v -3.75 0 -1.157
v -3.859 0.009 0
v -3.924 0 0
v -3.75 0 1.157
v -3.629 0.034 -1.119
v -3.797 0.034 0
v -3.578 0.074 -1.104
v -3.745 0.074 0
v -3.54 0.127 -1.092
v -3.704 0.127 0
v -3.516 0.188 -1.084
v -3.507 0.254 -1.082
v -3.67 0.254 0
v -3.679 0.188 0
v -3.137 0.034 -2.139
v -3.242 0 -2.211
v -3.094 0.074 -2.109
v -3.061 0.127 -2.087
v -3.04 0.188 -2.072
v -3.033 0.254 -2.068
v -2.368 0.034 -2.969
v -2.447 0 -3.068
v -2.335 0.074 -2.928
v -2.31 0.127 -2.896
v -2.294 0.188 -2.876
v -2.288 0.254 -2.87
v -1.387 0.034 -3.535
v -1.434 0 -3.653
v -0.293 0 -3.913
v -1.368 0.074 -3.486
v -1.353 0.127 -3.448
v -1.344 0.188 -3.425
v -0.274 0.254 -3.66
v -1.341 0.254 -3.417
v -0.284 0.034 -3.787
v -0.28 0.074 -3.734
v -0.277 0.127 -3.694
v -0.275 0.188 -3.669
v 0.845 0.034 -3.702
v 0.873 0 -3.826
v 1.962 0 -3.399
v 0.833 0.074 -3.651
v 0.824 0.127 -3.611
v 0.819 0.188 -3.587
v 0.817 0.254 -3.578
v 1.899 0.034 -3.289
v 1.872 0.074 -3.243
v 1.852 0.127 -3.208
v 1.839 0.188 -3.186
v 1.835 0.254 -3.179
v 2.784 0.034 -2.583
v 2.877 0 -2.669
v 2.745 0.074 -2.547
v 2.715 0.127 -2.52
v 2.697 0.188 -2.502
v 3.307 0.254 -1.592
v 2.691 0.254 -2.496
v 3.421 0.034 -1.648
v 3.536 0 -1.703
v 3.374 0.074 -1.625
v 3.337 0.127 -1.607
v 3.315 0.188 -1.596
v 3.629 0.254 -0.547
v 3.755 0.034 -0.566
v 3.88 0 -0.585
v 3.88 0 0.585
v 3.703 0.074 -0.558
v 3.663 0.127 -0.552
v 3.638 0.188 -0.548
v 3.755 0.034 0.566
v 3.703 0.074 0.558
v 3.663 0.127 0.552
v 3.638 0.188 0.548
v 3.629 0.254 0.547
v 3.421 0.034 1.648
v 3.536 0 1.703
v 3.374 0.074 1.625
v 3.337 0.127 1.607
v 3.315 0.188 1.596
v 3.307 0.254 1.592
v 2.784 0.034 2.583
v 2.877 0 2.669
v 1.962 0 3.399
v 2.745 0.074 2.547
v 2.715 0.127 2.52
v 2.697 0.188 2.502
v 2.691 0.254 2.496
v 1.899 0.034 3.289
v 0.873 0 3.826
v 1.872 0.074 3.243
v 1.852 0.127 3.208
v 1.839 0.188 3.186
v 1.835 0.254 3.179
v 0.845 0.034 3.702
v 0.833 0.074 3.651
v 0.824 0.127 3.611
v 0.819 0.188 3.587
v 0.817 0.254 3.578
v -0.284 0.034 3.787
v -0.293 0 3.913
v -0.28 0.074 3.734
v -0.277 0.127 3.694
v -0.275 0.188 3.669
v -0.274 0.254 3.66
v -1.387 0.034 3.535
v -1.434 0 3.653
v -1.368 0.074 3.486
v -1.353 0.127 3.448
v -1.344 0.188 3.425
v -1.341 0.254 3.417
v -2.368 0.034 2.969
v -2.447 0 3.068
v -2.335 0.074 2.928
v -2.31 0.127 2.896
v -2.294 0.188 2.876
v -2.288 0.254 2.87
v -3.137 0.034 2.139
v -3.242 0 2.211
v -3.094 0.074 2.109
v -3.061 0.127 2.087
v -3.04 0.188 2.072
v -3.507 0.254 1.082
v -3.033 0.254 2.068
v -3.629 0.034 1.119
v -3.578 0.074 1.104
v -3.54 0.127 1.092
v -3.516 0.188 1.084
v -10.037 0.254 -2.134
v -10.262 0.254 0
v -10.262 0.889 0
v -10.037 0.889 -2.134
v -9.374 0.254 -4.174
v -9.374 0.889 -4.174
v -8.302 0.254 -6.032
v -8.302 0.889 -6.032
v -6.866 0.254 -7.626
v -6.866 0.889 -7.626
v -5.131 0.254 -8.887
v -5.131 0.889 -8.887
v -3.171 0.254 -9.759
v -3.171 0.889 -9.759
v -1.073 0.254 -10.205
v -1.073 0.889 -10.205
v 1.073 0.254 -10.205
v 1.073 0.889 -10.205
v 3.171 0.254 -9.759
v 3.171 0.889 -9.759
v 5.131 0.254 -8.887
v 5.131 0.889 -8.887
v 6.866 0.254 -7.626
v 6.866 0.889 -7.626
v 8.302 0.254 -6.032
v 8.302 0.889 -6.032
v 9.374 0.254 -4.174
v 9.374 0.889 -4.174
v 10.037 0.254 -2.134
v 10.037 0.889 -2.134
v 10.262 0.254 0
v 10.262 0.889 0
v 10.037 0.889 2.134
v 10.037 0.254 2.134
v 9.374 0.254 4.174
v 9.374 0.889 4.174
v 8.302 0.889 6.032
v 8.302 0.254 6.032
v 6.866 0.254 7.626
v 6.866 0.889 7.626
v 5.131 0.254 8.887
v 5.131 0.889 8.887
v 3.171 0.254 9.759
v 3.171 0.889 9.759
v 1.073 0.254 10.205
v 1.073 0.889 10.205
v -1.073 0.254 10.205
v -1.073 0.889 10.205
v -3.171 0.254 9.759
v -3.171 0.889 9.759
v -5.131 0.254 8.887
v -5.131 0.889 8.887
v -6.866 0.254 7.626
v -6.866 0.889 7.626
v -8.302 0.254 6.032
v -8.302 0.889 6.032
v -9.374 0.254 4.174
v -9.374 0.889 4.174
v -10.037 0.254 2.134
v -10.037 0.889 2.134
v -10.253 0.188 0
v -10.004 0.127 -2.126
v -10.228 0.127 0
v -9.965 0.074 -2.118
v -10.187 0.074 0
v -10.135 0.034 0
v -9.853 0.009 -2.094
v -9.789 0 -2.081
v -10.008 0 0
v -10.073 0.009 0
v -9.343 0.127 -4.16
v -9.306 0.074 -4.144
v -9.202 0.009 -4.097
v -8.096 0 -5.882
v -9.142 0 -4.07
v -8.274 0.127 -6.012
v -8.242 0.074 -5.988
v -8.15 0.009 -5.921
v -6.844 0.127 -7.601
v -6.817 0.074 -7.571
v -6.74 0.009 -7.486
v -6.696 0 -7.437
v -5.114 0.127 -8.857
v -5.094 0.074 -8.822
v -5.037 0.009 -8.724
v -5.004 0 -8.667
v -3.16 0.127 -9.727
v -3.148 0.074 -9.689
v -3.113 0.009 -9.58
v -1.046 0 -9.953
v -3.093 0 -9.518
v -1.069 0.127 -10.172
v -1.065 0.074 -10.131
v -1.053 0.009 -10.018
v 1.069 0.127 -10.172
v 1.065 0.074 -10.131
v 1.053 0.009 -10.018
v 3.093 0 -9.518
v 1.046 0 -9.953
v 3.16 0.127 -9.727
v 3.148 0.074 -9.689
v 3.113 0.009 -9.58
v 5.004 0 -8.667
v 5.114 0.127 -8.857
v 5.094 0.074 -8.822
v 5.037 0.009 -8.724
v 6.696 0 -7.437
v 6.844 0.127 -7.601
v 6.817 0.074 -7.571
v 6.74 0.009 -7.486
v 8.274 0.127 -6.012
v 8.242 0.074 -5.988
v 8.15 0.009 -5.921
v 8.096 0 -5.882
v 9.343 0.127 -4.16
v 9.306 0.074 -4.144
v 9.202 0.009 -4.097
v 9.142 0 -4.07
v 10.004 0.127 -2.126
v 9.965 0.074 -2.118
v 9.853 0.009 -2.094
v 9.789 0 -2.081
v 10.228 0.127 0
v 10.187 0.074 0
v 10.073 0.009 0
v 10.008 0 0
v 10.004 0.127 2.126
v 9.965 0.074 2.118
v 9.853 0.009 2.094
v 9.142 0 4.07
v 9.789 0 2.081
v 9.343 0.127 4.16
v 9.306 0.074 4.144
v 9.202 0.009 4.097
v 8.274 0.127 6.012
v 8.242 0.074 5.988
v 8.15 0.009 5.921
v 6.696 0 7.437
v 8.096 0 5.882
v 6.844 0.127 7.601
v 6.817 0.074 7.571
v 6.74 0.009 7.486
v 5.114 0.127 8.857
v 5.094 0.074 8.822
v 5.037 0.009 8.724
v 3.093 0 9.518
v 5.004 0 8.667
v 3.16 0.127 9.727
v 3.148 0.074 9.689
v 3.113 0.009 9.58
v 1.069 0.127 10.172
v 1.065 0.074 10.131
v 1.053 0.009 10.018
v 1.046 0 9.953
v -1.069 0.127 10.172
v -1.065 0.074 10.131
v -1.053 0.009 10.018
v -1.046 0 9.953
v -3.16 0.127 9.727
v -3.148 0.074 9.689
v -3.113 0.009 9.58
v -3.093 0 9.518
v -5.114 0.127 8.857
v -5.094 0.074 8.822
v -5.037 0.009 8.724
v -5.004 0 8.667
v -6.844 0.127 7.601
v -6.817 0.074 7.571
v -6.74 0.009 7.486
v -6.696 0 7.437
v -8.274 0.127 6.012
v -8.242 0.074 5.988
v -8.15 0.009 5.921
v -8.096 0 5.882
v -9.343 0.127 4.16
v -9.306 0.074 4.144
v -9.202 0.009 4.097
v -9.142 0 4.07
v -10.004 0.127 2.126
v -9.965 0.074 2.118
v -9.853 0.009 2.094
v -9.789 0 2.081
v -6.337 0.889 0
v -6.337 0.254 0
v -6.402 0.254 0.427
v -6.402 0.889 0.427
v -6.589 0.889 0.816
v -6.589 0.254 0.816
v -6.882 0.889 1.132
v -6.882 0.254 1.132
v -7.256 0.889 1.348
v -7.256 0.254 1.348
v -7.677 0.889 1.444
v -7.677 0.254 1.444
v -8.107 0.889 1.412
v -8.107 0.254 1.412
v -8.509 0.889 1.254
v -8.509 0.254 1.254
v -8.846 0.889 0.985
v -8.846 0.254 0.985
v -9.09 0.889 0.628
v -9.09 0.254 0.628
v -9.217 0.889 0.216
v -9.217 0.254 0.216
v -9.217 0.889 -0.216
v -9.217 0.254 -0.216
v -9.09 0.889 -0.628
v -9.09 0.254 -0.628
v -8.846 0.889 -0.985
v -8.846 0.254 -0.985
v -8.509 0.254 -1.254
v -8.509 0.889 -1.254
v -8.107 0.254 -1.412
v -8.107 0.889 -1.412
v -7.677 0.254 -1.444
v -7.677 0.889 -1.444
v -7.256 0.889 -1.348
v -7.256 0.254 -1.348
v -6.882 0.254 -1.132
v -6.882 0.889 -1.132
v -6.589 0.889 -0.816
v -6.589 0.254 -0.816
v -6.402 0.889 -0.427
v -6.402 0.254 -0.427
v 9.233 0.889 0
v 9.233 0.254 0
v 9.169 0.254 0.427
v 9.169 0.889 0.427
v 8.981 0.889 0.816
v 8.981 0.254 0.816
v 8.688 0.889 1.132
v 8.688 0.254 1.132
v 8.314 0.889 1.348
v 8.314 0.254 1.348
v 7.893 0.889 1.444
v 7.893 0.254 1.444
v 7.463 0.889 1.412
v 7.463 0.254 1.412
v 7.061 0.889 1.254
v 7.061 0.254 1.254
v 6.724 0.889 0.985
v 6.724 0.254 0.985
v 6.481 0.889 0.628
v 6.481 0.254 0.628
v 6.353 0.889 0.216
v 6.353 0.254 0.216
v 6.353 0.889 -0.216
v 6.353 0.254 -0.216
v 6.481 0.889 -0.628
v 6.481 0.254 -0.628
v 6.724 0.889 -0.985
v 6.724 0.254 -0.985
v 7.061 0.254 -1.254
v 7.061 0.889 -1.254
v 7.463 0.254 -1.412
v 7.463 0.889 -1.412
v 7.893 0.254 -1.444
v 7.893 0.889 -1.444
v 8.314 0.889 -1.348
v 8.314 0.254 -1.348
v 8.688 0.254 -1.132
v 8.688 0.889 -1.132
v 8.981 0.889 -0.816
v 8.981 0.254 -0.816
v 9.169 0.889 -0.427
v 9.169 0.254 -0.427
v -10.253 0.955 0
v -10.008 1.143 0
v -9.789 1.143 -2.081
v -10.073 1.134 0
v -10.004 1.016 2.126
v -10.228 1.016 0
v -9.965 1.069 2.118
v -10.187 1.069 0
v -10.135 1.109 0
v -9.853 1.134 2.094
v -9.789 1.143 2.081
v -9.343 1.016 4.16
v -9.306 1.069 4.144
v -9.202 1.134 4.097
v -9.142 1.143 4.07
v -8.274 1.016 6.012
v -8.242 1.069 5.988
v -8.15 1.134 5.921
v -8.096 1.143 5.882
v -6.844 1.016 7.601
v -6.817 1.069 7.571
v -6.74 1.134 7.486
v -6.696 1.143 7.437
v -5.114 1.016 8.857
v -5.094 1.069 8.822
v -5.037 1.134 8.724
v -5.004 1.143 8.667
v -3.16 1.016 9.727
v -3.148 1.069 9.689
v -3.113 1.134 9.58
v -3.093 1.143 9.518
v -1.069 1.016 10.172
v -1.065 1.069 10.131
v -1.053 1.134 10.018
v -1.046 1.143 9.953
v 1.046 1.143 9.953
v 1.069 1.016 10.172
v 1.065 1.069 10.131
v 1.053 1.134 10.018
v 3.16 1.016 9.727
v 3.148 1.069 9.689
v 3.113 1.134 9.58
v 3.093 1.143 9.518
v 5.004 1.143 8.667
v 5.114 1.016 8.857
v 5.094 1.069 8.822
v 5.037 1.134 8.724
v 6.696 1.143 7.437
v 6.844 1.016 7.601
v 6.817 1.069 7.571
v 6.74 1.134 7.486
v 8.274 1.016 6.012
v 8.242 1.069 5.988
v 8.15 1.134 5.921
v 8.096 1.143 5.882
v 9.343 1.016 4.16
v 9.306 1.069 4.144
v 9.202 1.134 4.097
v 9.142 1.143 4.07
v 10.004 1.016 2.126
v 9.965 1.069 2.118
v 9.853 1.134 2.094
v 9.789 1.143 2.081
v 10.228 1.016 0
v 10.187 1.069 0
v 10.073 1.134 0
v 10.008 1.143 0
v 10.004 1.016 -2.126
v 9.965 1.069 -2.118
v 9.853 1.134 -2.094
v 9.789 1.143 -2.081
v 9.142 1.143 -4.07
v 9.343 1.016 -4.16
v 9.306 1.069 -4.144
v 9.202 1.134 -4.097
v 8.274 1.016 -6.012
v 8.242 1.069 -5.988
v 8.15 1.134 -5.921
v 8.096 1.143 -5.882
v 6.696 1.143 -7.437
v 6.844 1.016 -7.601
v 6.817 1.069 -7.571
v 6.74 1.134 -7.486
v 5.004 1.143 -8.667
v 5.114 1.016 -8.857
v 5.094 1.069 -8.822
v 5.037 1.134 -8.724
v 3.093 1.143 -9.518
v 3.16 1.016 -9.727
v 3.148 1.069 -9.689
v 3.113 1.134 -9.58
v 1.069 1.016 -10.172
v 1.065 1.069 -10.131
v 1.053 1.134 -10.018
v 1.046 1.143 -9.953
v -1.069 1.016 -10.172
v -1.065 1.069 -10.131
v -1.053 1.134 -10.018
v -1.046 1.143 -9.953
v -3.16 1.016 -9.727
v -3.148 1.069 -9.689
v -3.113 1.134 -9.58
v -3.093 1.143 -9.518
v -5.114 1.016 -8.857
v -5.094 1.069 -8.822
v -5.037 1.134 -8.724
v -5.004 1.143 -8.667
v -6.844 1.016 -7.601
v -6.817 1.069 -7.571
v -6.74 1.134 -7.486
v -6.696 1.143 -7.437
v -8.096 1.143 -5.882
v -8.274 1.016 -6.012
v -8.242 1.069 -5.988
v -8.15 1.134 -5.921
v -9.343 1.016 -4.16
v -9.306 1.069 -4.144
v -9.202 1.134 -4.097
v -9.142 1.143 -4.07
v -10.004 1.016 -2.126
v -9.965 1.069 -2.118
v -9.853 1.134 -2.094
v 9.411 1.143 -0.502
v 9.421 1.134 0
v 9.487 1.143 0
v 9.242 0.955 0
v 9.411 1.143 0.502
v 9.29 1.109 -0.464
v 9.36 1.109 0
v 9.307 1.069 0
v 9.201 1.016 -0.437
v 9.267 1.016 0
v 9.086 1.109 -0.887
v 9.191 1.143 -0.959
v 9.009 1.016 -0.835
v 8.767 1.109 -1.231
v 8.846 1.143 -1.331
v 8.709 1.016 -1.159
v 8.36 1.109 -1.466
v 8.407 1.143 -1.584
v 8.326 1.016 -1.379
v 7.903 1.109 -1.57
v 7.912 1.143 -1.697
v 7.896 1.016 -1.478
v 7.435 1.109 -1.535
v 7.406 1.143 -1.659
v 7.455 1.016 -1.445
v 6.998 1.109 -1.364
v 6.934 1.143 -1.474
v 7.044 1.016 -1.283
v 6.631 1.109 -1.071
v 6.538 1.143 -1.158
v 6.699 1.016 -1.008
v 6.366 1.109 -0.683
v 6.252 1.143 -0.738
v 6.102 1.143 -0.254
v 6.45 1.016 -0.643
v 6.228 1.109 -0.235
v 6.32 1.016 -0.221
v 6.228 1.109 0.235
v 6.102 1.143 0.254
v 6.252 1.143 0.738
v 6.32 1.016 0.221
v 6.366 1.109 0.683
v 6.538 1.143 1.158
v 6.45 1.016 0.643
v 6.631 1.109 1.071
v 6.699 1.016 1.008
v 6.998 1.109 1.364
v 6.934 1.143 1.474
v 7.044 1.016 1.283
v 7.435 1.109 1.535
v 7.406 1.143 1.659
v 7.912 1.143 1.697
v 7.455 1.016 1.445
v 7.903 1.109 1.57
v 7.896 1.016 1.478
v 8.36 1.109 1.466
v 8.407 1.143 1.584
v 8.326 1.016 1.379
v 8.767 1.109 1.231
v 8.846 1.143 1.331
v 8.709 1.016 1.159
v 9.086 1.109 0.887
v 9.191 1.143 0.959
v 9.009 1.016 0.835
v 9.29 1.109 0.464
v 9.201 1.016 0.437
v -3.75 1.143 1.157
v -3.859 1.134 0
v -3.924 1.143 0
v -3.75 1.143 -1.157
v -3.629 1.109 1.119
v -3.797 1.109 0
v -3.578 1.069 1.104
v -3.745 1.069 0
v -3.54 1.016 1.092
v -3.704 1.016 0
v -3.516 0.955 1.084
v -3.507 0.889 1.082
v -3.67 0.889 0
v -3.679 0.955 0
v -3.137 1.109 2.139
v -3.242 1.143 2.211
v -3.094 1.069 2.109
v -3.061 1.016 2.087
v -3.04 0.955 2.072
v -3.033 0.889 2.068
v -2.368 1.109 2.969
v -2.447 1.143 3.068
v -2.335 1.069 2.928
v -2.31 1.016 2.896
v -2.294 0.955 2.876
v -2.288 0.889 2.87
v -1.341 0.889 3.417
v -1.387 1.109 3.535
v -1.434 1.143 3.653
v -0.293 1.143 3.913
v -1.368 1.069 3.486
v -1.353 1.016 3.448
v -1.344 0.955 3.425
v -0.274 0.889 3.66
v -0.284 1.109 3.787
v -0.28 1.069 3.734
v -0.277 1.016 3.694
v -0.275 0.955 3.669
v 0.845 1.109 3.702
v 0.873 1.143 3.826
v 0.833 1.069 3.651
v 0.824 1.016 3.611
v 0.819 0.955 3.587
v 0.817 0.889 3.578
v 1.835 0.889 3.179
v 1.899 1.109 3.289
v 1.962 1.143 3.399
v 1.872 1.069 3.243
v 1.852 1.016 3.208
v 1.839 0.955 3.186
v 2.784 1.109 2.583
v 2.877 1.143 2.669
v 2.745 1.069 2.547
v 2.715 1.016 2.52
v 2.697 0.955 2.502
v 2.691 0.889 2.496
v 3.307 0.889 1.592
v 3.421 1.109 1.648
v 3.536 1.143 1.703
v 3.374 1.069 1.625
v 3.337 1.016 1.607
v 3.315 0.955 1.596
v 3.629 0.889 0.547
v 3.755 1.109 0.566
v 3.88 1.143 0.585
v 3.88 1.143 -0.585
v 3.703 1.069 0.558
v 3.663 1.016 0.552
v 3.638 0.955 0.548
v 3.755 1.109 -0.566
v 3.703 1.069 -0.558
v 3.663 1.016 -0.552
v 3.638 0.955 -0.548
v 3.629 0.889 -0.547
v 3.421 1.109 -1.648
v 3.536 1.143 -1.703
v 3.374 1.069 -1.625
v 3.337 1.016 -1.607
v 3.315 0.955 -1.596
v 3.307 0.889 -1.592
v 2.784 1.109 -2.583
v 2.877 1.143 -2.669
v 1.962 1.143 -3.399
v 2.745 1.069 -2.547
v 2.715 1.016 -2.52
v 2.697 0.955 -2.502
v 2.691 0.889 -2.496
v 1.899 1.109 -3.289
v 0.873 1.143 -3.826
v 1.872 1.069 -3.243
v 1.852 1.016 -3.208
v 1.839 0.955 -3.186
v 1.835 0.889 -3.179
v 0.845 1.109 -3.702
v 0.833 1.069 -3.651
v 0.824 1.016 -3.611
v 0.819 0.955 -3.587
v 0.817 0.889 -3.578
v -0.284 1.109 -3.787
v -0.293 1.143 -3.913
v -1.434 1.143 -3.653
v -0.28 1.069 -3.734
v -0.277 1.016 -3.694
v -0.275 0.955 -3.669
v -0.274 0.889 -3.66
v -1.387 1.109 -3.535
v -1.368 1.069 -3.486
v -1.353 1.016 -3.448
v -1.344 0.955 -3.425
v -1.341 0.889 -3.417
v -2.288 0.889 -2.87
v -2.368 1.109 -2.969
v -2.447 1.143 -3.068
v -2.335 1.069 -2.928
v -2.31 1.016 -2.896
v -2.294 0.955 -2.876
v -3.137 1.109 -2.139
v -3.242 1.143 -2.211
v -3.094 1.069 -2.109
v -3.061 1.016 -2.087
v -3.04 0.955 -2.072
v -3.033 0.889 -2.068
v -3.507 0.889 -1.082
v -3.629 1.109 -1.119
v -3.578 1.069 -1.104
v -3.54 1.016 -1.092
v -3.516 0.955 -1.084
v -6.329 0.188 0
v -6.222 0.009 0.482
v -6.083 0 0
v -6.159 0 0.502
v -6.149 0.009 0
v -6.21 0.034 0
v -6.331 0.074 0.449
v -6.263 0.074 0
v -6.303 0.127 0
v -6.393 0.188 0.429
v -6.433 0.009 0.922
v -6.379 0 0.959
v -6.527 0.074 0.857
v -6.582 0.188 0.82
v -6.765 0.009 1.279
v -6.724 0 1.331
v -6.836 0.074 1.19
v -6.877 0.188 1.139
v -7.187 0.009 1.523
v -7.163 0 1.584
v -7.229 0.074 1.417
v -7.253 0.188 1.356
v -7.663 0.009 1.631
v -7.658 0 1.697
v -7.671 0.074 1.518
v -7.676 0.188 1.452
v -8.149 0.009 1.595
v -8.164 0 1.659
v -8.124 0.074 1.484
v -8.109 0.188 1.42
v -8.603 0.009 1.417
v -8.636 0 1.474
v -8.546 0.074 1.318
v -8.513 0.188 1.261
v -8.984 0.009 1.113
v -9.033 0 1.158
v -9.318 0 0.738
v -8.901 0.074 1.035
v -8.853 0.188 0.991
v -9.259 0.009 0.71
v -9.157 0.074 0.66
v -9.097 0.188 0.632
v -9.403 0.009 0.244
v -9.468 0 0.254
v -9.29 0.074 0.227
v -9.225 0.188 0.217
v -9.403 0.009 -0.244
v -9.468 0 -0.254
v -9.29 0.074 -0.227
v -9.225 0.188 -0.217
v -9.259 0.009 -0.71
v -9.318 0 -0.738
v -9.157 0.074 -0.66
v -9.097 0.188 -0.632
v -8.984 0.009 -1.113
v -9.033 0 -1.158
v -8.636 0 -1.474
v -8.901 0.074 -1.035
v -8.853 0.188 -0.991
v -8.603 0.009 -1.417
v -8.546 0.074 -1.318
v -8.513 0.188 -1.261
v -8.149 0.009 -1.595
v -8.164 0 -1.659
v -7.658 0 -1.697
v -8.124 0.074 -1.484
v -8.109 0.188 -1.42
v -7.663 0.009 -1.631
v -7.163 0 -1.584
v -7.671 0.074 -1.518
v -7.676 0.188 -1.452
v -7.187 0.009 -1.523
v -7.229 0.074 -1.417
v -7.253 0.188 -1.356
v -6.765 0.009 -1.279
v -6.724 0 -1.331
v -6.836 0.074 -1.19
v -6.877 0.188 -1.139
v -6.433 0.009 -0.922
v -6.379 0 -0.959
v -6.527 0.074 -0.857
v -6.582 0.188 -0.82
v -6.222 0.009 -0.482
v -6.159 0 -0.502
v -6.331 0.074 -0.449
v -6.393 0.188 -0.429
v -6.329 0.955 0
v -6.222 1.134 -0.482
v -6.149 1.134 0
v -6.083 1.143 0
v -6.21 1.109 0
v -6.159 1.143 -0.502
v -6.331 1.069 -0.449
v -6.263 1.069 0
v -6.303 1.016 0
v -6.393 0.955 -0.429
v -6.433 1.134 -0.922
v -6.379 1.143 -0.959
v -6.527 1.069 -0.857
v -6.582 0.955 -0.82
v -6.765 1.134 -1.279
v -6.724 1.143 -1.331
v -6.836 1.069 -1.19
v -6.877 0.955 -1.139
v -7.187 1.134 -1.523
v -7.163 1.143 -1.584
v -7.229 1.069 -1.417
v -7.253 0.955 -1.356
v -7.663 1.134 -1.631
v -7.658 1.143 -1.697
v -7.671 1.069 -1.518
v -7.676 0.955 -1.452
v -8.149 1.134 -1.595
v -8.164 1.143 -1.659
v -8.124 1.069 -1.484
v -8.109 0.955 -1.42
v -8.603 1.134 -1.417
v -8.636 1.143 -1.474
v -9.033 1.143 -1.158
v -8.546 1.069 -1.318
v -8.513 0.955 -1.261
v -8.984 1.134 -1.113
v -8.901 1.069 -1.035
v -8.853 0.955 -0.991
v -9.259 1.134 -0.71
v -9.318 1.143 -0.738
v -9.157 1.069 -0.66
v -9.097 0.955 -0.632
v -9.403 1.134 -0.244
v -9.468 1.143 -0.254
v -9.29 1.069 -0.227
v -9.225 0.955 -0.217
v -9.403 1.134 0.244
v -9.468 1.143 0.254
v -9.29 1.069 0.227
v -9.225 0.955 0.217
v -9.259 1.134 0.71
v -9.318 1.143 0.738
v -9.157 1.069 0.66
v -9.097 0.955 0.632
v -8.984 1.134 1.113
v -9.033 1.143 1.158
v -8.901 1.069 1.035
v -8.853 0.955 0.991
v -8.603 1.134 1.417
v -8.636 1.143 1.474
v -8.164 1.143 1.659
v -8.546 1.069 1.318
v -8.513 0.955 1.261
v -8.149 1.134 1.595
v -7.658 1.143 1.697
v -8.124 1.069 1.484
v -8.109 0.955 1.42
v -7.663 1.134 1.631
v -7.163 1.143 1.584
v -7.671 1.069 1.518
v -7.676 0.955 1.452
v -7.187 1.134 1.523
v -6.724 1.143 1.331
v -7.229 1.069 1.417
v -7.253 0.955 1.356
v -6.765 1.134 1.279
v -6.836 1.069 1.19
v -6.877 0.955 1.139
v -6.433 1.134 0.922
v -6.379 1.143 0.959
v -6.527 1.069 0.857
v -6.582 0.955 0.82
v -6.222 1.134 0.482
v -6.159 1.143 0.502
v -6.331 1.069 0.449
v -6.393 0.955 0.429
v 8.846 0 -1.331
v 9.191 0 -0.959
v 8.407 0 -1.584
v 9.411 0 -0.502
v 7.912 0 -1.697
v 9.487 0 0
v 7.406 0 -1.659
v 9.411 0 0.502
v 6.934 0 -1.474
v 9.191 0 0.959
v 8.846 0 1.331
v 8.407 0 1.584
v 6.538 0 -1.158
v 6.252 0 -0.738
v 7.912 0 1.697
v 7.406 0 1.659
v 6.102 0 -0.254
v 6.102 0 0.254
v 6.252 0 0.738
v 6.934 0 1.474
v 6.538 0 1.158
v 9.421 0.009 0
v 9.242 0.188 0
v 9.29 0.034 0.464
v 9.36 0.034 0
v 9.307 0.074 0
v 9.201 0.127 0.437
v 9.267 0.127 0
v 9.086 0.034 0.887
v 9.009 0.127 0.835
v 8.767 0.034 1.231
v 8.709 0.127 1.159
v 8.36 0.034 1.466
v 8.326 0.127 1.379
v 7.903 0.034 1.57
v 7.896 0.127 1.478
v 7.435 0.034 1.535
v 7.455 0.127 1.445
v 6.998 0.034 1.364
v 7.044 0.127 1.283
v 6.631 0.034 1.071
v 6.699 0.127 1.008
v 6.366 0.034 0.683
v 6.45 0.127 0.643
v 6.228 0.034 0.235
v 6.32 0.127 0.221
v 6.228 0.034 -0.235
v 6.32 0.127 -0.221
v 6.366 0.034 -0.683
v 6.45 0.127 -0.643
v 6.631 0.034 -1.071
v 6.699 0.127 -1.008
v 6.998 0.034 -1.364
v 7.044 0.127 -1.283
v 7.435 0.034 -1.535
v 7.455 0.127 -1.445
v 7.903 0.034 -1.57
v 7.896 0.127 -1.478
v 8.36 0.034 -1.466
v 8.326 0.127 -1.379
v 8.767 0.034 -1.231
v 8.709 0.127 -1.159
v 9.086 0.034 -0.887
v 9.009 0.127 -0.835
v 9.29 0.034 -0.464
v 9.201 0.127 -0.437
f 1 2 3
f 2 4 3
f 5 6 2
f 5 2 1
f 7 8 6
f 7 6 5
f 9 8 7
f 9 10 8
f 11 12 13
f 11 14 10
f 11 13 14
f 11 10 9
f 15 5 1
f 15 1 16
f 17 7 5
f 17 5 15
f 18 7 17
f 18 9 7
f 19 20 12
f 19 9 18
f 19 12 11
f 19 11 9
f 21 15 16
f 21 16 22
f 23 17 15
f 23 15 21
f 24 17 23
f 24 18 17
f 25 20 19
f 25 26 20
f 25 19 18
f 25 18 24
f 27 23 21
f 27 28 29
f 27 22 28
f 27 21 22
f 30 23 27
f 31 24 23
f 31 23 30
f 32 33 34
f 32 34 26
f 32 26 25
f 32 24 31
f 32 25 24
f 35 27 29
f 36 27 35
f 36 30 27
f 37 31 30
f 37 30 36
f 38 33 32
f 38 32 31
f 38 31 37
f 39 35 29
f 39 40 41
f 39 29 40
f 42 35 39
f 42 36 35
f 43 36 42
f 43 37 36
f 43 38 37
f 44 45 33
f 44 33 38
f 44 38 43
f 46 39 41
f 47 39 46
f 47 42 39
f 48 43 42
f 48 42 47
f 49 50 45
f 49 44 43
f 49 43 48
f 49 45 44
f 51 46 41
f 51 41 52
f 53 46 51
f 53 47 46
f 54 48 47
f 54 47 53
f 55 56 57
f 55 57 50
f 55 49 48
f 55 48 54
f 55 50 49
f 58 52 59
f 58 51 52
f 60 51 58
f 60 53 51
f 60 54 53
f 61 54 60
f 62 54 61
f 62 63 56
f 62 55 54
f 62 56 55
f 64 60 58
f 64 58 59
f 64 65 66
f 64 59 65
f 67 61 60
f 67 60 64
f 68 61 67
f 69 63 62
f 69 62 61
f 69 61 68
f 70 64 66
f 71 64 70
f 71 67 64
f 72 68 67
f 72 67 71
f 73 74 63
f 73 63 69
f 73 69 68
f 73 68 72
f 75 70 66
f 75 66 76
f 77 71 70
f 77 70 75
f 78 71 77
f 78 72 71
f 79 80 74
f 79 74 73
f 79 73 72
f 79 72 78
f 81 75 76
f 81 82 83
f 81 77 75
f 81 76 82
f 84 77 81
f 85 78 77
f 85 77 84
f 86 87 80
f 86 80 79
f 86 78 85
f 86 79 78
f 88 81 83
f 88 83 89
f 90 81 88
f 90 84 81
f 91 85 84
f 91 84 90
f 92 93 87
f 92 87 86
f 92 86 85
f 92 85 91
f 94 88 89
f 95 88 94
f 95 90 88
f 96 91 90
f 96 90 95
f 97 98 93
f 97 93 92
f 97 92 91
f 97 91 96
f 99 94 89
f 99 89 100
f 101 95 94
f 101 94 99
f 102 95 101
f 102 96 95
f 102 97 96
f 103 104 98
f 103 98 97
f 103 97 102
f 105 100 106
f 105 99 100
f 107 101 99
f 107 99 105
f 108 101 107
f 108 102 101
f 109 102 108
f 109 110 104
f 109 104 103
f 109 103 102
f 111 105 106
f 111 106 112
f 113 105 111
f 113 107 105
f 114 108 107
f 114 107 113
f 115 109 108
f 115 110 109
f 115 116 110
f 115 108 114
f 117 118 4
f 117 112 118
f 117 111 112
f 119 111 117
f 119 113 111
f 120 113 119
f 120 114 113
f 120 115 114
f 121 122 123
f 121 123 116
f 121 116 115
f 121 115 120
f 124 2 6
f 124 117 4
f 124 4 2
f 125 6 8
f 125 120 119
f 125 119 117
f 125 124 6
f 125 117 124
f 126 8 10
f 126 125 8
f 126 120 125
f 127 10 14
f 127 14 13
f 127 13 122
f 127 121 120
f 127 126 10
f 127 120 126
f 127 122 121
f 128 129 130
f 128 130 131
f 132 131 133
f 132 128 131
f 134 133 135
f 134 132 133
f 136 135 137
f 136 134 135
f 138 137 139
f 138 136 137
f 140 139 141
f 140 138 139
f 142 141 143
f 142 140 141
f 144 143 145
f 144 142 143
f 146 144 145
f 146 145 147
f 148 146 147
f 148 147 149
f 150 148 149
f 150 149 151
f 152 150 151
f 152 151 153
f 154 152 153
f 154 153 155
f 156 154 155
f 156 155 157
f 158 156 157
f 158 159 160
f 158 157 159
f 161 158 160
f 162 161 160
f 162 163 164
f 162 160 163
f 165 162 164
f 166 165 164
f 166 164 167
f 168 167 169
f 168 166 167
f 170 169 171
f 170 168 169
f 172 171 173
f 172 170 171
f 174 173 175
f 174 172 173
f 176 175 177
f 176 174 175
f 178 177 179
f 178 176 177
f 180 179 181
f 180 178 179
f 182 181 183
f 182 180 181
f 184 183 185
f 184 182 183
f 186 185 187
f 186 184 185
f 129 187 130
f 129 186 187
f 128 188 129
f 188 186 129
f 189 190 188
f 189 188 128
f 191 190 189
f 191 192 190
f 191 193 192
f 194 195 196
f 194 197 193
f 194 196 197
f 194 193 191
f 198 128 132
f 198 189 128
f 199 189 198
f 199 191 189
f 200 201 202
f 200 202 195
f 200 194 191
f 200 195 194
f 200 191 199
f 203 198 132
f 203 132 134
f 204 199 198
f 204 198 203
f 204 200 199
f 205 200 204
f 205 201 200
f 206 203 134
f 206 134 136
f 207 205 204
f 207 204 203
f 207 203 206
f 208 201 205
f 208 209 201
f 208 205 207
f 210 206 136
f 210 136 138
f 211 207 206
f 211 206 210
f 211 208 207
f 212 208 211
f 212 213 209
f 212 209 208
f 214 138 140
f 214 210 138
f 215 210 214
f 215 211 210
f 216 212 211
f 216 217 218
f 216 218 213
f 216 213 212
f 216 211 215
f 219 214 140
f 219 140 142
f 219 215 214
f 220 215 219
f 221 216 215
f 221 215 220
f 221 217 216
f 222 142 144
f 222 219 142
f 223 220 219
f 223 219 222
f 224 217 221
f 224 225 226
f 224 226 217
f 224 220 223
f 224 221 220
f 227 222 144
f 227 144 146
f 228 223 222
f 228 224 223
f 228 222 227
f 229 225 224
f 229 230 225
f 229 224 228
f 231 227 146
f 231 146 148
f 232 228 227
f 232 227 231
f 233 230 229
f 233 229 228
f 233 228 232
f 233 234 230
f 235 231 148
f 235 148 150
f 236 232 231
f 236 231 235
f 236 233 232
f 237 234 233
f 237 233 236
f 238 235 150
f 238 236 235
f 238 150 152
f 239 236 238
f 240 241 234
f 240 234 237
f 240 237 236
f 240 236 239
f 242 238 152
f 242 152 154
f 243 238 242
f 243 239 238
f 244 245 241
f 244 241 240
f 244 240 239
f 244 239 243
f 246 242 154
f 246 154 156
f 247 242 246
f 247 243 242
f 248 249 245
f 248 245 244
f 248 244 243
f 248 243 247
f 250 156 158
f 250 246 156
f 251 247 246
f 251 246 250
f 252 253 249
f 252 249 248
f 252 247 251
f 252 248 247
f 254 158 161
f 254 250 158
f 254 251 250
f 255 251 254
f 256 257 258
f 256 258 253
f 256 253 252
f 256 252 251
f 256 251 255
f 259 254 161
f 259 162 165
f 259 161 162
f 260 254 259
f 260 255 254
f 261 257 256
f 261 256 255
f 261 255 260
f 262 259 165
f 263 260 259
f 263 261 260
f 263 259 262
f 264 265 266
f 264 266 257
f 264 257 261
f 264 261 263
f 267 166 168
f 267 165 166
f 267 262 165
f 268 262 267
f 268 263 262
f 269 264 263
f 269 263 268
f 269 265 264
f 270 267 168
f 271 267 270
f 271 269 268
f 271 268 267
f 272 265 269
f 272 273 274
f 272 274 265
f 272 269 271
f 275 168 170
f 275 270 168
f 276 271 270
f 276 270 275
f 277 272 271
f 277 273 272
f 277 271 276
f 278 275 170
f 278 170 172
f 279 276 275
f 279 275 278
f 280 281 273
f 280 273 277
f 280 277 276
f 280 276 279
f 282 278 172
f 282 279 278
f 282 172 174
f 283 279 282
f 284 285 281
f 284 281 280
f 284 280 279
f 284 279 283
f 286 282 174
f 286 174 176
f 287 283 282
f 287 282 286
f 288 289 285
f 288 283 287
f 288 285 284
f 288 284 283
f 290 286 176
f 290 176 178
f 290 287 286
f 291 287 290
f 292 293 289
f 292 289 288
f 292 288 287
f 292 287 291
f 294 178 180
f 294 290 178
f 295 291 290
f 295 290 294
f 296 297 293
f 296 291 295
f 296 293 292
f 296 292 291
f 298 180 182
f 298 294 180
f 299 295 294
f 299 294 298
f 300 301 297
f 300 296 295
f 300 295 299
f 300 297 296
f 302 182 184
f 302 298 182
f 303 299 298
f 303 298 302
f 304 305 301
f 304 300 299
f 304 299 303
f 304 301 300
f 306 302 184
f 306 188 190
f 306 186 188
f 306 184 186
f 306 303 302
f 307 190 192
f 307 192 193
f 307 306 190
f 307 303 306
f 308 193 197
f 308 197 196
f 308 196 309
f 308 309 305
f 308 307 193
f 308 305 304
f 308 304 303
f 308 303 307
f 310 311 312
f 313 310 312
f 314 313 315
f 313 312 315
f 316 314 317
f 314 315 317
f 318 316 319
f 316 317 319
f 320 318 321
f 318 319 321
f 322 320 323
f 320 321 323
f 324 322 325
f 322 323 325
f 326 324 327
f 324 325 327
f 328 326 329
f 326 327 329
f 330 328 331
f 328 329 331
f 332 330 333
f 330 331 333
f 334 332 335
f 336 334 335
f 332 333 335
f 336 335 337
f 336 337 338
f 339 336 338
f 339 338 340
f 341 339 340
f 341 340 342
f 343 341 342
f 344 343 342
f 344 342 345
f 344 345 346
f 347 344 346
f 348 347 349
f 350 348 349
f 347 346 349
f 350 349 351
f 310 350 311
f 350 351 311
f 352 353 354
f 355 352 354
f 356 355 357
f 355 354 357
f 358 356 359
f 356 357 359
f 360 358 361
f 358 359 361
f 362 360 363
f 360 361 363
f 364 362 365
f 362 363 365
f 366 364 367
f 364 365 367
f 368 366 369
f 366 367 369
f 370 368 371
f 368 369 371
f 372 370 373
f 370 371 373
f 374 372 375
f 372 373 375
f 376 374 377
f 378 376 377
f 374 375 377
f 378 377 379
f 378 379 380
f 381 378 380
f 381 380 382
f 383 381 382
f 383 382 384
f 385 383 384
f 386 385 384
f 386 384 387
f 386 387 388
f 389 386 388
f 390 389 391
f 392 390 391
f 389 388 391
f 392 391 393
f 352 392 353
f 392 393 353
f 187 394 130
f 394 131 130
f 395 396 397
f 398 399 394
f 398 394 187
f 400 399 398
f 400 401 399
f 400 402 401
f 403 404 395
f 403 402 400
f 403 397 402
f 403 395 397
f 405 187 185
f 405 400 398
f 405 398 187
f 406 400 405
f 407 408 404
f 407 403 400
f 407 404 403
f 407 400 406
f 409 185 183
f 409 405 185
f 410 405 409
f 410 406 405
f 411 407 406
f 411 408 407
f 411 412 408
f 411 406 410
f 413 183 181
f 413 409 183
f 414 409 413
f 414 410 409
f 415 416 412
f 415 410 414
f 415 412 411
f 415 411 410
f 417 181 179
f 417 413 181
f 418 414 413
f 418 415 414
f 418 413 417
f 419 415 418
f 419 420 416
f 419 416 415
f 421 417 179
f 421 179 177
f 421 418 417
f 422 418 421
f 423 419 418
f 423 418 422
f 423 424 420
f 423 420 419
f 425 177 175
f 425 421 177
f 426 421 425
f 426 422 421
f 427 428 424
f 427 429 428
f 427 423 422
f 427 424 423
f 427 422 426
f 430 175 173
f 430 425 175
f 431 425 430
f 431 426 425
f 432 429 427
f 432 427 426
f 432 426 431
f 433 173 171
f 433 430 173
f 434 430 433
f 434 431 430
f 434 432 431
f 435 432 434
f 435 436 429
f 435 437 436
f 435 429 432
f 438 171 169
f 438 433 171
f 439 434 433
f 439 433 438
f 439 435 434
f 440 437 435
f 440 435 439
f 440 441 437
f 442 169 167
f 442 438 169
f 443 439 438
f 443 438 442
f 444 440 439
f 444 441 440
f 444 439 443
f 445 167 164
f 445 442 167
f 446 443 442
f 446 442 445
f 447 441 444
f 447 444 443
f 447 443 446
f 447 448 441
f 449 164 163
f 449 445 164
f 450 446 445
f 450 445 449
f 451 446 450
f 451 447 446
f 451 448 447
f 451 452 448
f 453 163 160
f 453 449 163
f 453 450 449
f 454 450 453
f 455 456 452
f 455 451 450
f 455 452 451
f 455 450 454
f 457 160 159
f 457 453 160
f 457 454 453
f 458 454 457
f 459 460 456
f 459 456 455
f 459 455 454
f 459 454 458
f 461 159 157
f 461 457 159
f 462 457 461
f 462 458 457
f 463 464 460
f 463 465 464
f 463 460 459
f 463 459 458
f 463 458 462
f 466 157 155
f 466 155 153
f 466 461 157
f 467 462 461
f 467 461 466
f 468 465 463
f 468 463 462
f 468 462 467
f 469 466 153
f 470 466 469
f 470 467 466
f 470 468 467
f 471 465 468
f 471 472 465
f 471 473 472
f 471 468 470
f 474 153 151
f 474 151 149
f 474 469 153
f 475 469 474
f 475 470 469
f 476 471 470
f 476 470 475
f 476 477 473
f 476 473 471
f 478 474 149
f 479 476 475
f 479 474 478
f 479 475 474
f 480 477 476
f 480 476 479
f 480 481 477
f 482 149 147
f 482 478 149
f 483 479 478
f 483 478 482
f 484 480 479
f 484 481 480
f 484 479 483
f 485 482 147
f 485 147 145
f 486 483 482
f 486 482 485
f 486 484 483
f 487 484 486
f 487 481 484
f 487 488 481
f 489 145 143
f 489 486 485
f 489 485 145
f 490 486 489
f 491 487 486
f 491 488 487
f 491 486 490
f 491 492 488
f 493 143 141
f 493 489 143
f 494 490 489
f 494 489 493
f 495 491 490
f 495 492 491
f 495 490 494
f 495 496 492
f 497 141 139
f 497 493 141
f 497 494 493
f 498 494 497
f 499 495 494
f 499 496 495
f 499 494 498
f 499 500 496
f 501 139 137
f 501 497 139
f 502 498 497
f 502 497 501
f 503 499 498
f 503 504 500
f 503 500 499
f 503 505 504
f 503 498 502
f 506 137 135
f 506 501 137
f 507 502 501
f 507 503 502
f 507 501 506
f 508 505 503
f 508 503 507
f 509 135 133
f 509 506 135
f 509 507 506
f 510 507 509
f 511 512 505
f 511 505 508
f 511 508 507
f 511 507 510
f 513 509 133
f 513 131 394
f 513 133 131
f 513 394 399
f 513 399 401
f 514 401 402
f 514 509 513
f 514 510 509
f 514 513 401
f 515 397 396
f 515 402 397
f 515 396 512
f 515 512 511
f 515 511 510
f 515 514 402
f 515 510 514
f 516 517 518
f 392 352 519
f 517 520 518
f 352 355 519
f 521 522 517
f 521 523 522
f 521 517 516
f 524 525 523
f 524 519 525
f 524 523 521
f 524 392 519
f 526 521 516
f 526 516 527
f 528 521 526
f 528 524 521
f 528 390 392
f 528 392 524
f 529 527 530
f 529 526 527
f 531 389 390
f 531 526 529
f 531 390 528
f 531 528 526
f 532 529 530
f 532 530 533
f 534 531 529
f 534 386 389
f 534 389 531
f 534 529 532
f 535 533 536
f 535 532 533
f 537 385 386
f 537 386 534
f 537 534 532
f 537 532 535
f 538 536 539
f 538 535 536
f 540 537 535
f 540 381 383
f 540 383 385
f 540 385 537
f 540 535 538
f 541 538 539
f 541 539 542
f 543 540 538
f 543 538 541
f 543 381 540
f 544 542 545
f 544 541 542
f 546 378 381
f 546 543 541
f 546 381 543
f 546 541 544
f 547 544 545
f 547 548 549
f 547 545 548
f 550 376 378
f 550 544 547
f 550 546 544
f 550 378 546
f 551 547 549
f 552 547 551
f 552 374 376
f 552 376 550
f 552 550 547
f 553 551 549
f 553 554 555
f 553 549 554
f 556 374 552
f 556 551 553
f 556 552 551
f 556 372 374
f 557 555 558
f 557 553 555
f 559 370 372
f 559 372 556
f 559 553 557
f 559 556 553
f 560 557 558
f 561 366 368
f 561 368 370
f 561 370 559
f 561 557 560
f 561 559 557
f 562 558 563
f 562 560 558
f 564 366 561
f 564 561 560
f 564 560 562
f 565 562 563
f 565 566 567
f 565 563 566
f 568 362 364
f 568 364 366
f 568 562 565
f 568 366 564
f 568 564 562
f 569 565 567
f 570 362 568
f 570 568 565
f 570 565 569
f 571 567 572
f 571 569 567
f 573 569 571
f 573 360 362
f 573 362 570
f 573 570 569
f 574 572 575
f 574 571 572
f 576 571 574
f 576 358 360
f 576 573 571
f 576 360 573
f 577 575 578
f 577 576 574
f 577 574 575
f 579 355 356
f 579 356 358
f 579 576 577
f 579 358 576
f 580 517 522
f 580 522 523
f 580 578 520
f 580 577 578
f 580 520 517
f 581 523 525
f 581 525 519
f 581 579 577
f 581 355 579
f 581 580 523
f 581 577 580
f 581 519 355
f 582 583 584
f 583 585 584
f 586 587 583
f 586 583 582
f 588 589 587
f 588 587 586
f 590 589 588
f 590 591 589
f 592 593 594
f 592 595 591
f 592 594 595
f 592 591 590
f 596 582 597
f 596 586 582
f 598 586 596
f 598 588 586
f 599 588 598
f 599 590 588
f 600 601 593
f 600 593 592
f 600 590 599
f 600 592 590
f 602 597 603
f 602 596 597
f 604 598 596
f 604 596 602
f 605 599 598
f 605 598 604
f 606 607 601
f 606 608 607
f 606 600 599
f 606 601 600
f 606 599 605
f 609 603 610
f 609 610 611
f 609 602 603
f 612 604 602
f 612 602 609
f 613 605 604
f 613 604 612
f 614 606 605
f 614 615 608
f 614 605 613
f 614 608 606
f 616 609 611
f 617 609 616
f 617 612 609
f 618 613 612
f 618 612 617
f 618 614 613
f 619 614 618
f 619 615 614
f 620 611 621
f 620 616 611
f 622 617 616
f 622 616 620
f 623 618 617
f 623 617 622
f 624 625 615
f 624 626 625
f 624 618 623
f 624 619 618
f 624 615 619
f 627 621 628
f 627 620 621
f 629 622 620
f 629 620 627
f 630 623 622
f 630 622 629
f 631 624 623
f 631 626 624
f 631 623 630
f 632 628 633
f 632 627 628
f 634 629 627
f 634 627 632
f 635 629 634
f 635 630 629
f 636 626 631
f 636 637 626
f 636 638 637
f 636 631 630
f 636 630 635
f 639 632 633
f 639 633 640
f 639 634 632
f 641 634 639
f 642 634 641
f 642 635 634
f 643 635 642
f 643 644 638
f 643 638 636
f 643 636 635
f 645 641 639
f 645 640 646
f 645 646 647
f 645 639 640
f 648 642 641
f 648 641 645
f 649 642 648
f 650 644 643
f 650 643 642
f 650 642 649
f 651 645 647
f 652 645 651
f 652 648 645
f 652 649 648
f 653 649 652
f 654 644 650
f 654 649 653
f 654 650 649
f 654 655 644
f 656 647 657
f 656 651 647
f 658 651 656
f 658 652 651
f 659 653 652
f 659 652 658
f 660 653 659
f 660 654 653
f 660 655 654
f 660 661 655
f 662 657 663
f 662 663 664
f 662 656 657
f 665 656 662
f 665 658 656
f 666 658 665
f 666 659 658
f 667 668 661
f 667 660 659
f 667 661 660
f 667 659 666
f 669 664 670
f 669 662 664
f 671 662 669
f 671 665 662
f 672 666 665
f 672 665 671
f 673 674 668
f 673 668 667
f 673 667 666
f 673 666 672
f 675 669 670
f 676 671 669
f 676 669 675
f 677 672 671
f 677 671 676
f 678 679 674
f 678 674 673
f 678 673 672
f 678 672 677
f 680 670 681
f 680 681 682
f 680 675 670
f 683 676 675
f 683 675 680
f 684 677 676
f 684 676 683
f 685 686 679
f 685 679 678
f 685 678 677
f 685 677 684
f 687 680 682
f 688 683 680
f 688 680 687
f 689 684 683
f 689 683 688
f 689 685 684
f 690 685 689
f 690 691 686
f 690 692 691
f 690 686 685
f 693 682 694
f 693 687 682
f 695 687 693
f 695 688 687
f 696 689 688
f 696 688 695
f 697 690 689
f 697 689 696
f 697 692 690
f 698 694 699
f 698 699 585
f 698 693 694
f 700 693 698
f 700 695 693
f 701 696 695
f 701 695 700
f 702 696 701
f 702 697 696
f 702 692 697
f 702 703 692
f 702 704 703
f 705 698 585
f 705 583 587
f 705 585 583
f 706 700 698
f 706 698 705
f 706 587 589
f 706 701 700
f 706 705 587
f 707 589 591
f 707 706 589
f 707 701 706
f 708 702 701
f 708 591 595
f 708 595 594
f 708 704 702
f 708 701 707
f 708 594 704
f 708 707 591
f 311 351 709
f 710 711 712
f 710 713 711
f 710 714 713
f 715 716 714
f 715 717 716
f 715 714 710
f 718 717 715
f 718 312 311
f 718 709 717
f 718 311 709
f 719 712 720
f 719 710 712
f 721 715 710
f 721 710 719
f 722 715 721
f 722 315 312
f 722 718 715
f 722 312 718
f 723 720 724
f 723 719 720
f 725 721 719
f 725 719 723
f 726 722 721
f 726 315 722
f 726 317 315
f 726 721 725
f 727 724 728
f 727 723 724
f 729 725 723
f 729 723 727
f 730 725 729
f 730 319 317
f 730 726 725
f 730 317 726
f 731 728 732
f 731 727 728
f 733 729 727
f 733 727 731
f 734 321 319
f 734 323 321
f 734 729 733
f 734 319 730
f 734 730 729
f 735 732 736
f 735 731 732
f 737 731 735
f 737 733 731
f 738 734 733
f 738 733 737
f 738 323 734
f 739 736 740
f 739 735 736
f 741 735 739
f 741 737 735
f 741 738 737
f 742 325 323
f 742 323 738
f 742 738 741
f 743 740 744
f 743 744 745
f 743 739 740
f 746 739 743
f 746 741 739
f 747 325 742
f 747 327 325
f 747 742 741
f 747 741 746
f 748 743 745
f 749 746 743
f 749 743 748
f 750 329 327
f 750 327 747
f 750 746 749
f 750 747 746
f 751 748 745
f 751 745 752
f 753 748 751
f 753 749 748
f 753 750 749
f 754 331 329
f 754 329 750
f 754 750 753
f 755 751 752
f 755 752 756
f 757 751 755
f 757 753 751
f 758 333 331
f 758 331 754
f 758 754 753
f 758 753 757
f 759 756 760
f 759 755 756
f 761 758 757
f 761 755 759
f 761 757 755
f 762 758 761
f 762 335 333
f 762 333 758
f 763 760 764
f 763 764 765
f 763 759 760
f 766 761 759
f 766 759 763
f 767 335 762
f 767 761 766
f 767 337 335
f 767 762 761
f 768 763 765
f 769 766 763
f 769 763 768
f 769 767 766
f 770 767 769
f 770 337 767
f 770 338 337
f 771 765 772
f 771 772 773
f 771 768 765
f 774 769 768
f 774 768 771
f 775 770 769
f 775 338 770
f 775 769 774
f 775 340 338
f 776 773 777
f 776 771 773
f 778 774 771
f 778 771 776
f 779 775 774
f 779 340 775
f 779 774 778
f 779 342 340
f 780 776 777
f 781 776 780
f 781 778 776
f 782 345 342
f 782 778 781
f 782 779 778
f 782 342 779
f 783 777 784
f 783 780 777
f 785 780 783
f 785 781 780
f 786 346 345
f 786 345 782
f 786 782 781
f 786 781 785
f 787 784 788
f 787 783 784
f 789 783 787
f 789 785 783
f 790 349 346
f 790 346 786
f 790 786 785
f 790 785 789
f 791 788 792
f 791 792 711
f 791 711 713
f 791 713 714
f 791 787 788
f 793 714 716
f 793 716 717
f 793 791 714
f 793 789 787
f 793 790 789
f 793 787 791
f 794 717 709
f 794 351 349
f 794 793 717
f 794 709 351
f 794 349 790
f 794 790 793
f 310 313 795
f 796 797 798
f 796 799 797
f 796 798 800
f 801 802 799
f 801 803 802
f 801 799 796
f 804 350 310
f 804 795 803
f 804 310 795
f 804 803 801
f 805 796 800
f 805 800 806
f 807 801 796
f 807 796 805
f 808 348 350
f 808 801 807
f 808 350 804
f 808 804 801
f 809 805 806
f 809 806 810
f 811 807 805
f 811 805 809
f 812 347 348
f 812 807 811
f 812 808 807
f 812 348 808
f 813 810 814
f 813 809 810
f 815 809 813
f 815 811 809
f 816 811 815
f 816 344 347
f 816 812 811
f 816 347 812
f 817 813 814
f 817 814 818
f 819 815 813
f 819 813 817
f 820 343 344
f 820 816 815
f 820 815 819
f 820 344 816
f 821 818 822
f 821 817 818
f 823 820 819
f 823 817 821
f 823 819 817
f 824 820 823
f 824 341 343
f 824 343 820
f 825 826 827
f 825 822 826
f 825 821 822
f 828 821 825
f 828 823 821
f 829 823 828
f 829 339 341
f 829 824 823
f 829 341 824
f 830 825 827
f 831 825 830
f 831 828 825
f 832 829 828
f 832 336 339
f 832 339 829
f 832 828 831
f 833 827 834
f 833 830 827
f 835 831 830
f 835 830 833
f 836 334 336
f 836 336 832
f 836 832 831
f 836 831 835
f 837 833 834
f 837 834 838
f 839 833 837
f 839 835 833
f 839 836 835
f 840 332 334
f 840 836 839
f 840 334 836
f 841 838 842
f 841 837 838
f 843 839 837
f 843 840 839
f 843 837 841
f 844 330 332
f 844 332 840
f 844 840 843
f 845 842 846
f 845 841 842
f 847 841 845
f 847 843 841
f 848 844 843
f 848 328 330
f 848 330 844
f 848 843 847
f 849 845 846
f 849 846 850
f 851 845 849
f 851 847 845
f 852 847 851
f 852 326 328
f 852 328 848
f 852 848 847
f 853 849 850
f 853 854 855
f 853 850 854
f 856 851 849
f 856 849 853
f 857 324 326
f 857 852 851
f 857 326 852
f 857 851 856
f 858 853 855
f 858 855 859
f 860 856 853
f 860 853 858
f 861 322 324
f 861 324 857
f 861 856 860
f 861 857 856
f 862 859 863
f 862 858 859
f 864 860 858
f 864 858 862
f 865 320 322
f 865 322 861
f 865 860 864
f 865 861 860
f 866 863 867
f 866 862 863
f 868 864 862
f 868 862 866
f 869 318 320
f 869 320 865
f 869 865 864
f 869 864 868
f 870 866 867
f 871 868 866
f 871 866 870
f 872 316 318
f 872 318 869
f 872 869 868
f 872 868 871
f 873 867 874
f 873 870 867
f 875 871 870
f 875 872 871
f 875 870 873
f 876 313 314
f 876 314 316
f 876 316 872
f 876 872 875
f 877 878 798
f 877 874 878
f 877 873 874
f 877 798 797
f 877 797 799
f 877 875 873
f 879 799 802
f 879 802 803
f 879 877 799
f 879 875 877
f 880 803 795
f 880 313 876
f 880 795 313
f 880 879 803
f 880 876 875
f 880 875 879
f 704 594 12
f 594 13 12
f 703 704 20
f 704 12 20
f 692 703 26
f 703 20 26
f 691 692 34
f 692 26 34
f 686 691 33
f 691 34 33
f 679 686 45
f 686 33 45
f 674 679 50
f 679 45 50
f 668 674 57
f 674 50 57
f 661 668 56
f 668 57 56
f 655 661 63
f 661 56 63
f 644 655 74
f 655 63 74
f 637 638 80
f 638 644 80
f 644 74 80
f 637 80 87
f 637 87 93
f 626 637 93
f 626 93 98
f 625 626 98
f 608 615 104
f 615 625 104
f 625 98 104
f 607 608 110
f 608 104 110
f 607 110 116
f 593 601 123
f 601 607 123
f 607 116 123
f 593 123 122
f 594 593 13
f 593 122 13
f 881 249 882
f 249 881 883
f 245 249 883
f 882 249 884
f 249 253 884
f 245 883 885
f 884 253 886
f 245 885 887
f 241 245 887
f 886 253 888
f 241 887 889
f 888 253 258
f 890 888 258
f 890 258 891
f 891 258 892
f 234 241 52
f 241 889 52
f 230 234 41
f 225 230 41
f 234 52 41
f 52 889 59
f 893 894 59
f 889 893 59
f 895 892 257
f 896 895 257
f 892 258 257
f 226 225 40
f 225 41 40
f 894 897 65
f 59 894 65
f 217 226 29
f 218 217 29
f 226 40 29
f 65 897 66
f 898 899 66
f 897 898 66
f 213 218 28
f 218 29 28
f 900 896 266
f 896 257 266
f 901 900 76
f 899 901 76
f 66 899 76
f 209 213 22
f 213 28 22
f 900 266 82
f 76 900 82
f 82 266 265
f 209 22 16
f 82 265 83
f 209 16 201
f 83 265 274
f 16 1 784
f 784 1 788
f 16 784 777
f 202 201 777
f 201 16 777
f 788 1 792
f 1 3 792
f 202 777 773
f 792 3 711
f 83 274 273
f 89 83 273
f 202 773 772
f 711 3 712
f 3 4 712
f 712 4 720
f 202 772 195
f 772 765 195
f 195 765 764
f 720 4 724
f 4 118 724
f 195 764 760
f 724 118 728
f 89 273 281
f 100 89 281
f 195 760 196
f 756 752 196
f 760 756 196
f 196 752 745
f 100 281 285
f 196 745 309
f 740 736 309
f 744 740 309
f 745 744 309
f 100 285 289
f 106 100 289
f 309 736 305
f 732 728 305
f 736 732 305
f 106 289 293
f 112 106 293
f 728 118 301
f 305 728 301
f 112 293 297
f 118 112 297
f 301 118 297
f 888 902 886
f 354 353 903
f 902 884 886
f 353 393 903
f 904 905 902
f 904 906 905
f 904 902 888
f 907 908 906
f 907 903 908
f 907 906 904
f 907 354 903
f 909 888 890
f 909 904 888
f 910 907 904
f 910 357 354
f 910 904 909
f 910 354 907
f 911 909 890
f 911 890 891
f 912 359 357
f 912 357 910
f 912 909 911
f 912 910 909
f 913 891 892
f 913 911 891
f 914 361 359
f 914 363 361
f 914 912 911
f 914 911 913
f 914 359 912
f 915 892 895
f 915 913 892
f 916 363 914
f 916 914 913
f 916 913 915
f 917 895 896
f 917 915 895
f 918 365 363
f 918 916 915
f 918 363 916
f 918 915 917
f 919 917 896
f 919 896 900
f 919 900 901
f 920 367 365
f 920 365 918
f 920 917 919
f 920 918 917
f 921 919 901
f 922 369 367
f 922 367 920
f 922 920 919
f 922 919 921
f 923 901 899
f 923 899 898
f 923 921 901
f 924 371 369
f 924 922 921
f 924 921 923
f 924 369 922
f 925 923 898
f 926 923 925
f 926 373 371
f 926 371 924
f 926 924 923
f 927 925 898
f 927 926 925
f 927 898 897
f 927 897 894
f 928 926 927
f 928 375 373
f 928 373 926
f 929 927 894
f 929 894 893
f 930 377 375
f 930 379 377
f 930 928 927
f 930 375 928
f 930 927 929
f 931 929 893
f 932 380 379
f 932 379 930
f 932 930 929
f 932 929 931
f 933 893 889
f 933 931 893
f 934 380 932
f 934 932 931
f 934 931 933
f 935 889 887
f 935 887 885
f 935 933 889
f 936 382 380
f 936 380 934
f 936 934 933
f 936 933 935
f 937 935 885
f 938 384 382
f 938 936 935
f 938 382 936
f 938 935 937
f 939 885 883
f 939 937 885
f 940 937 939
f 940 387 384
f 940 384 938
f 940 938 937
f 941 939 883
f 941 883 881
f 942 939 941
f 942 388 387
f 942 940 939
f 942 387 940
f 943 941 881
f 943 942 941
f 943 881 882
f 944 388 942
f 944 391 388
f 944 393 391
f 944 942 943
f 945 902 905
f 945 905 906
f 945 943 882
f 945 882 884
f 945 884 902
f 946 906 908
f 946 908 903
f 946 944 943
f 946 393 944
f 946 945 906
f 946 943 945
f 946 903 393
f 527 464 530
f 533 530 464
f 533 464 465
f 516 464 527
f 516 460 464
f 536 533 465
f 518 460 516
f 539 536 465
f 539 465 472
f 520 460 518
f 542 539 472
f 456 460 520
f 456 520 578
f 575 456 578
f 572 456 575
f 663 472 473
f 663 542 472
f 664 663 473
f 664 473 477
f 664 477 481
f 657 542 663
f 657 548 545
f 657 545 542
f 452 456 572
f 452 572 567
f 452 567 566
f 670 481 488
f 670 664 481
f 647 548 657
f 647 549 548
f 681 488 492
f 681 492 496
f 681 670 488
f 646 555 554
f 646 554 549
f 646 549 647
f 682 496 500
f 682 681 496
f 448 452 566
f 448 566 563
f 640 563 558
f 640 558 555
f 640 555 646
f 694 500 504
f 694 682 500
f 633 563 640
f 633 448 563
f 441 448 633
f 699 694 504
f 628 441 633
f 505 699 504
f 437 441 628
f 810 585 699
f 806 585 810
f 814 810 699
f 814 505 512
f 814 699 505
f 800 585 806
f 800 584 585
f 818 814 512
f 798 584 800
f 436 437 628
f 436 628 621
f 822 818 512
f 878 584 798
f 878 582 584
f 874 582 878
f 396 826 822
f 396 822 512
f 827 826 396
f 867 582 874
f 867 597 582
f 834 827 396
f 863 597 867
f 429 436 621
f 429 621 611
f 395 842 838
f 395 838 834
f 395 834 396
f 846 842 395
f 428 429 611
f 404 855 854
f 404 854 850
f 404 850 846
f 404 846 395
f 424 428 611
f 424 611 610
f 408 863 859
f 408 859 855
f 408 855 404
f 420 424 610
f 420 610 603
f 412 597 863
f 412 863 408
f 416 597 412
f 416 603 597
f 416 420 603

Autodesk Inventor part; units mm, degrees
ref_plane "YZ Plane" through (0, 0, 0) normal (1, 0, 0) x (0, 1, 0)
ref_plane "XZ Plane" through (0, 0, 0) normal (0, 1, 0) x (-1, 0, 0)
ref_plane "XY Plane" through (0, 0, 0) normal (0, 0, 1) x (1, 0, 0)
sketch "Sketch1" plane through (0, 0, 0) normal (0, 1, 0) x (-1, 0, 0)
  circle A0 centre (0, 0) radius 10.2616
  circle A1 centre (0, 0) radius 3.6703
  dimension "d0" = 20.5232
  dimension "d1" = 7.3406
extrude "Extrusion1" add sketch "Sketch1" along normal blind 1.143
sketch "Sketch3" plane through (0, 0, 0) normal (0, -1, 0) x (1, 0, 0)
  circle A0 centre (0, 0) radius 10.2616 construction
  line L0 (-10.2616, 0) -> (10.2616, 0) construction
  circle A1 centre (-7.7851, 0) radius 1.4478
  circle A2 centre (7.7851, 0) radius 1.4478
  dimension "d7" = 7.7851
  dimension "d8" = 2.8956
  dimension "d11" = 360
extrude "Extrusion3" cut sketch "Sketch3" against normal through all
fillet "Fillet2" radius 0.254 8 edges at (10.2616, 1.143, 0) (6.3373, 1.143, 0) (3.6703, 1.143, 0) (-9.2329, 1.143, 0) (10.2616, 0, 0) (-9.2329, 0, 0) (6.3373, 0, 0) (3.6703, 0, 0)
properties part number "Steele Sewing Machine Bobbin Top" material "ABS Plastic"
